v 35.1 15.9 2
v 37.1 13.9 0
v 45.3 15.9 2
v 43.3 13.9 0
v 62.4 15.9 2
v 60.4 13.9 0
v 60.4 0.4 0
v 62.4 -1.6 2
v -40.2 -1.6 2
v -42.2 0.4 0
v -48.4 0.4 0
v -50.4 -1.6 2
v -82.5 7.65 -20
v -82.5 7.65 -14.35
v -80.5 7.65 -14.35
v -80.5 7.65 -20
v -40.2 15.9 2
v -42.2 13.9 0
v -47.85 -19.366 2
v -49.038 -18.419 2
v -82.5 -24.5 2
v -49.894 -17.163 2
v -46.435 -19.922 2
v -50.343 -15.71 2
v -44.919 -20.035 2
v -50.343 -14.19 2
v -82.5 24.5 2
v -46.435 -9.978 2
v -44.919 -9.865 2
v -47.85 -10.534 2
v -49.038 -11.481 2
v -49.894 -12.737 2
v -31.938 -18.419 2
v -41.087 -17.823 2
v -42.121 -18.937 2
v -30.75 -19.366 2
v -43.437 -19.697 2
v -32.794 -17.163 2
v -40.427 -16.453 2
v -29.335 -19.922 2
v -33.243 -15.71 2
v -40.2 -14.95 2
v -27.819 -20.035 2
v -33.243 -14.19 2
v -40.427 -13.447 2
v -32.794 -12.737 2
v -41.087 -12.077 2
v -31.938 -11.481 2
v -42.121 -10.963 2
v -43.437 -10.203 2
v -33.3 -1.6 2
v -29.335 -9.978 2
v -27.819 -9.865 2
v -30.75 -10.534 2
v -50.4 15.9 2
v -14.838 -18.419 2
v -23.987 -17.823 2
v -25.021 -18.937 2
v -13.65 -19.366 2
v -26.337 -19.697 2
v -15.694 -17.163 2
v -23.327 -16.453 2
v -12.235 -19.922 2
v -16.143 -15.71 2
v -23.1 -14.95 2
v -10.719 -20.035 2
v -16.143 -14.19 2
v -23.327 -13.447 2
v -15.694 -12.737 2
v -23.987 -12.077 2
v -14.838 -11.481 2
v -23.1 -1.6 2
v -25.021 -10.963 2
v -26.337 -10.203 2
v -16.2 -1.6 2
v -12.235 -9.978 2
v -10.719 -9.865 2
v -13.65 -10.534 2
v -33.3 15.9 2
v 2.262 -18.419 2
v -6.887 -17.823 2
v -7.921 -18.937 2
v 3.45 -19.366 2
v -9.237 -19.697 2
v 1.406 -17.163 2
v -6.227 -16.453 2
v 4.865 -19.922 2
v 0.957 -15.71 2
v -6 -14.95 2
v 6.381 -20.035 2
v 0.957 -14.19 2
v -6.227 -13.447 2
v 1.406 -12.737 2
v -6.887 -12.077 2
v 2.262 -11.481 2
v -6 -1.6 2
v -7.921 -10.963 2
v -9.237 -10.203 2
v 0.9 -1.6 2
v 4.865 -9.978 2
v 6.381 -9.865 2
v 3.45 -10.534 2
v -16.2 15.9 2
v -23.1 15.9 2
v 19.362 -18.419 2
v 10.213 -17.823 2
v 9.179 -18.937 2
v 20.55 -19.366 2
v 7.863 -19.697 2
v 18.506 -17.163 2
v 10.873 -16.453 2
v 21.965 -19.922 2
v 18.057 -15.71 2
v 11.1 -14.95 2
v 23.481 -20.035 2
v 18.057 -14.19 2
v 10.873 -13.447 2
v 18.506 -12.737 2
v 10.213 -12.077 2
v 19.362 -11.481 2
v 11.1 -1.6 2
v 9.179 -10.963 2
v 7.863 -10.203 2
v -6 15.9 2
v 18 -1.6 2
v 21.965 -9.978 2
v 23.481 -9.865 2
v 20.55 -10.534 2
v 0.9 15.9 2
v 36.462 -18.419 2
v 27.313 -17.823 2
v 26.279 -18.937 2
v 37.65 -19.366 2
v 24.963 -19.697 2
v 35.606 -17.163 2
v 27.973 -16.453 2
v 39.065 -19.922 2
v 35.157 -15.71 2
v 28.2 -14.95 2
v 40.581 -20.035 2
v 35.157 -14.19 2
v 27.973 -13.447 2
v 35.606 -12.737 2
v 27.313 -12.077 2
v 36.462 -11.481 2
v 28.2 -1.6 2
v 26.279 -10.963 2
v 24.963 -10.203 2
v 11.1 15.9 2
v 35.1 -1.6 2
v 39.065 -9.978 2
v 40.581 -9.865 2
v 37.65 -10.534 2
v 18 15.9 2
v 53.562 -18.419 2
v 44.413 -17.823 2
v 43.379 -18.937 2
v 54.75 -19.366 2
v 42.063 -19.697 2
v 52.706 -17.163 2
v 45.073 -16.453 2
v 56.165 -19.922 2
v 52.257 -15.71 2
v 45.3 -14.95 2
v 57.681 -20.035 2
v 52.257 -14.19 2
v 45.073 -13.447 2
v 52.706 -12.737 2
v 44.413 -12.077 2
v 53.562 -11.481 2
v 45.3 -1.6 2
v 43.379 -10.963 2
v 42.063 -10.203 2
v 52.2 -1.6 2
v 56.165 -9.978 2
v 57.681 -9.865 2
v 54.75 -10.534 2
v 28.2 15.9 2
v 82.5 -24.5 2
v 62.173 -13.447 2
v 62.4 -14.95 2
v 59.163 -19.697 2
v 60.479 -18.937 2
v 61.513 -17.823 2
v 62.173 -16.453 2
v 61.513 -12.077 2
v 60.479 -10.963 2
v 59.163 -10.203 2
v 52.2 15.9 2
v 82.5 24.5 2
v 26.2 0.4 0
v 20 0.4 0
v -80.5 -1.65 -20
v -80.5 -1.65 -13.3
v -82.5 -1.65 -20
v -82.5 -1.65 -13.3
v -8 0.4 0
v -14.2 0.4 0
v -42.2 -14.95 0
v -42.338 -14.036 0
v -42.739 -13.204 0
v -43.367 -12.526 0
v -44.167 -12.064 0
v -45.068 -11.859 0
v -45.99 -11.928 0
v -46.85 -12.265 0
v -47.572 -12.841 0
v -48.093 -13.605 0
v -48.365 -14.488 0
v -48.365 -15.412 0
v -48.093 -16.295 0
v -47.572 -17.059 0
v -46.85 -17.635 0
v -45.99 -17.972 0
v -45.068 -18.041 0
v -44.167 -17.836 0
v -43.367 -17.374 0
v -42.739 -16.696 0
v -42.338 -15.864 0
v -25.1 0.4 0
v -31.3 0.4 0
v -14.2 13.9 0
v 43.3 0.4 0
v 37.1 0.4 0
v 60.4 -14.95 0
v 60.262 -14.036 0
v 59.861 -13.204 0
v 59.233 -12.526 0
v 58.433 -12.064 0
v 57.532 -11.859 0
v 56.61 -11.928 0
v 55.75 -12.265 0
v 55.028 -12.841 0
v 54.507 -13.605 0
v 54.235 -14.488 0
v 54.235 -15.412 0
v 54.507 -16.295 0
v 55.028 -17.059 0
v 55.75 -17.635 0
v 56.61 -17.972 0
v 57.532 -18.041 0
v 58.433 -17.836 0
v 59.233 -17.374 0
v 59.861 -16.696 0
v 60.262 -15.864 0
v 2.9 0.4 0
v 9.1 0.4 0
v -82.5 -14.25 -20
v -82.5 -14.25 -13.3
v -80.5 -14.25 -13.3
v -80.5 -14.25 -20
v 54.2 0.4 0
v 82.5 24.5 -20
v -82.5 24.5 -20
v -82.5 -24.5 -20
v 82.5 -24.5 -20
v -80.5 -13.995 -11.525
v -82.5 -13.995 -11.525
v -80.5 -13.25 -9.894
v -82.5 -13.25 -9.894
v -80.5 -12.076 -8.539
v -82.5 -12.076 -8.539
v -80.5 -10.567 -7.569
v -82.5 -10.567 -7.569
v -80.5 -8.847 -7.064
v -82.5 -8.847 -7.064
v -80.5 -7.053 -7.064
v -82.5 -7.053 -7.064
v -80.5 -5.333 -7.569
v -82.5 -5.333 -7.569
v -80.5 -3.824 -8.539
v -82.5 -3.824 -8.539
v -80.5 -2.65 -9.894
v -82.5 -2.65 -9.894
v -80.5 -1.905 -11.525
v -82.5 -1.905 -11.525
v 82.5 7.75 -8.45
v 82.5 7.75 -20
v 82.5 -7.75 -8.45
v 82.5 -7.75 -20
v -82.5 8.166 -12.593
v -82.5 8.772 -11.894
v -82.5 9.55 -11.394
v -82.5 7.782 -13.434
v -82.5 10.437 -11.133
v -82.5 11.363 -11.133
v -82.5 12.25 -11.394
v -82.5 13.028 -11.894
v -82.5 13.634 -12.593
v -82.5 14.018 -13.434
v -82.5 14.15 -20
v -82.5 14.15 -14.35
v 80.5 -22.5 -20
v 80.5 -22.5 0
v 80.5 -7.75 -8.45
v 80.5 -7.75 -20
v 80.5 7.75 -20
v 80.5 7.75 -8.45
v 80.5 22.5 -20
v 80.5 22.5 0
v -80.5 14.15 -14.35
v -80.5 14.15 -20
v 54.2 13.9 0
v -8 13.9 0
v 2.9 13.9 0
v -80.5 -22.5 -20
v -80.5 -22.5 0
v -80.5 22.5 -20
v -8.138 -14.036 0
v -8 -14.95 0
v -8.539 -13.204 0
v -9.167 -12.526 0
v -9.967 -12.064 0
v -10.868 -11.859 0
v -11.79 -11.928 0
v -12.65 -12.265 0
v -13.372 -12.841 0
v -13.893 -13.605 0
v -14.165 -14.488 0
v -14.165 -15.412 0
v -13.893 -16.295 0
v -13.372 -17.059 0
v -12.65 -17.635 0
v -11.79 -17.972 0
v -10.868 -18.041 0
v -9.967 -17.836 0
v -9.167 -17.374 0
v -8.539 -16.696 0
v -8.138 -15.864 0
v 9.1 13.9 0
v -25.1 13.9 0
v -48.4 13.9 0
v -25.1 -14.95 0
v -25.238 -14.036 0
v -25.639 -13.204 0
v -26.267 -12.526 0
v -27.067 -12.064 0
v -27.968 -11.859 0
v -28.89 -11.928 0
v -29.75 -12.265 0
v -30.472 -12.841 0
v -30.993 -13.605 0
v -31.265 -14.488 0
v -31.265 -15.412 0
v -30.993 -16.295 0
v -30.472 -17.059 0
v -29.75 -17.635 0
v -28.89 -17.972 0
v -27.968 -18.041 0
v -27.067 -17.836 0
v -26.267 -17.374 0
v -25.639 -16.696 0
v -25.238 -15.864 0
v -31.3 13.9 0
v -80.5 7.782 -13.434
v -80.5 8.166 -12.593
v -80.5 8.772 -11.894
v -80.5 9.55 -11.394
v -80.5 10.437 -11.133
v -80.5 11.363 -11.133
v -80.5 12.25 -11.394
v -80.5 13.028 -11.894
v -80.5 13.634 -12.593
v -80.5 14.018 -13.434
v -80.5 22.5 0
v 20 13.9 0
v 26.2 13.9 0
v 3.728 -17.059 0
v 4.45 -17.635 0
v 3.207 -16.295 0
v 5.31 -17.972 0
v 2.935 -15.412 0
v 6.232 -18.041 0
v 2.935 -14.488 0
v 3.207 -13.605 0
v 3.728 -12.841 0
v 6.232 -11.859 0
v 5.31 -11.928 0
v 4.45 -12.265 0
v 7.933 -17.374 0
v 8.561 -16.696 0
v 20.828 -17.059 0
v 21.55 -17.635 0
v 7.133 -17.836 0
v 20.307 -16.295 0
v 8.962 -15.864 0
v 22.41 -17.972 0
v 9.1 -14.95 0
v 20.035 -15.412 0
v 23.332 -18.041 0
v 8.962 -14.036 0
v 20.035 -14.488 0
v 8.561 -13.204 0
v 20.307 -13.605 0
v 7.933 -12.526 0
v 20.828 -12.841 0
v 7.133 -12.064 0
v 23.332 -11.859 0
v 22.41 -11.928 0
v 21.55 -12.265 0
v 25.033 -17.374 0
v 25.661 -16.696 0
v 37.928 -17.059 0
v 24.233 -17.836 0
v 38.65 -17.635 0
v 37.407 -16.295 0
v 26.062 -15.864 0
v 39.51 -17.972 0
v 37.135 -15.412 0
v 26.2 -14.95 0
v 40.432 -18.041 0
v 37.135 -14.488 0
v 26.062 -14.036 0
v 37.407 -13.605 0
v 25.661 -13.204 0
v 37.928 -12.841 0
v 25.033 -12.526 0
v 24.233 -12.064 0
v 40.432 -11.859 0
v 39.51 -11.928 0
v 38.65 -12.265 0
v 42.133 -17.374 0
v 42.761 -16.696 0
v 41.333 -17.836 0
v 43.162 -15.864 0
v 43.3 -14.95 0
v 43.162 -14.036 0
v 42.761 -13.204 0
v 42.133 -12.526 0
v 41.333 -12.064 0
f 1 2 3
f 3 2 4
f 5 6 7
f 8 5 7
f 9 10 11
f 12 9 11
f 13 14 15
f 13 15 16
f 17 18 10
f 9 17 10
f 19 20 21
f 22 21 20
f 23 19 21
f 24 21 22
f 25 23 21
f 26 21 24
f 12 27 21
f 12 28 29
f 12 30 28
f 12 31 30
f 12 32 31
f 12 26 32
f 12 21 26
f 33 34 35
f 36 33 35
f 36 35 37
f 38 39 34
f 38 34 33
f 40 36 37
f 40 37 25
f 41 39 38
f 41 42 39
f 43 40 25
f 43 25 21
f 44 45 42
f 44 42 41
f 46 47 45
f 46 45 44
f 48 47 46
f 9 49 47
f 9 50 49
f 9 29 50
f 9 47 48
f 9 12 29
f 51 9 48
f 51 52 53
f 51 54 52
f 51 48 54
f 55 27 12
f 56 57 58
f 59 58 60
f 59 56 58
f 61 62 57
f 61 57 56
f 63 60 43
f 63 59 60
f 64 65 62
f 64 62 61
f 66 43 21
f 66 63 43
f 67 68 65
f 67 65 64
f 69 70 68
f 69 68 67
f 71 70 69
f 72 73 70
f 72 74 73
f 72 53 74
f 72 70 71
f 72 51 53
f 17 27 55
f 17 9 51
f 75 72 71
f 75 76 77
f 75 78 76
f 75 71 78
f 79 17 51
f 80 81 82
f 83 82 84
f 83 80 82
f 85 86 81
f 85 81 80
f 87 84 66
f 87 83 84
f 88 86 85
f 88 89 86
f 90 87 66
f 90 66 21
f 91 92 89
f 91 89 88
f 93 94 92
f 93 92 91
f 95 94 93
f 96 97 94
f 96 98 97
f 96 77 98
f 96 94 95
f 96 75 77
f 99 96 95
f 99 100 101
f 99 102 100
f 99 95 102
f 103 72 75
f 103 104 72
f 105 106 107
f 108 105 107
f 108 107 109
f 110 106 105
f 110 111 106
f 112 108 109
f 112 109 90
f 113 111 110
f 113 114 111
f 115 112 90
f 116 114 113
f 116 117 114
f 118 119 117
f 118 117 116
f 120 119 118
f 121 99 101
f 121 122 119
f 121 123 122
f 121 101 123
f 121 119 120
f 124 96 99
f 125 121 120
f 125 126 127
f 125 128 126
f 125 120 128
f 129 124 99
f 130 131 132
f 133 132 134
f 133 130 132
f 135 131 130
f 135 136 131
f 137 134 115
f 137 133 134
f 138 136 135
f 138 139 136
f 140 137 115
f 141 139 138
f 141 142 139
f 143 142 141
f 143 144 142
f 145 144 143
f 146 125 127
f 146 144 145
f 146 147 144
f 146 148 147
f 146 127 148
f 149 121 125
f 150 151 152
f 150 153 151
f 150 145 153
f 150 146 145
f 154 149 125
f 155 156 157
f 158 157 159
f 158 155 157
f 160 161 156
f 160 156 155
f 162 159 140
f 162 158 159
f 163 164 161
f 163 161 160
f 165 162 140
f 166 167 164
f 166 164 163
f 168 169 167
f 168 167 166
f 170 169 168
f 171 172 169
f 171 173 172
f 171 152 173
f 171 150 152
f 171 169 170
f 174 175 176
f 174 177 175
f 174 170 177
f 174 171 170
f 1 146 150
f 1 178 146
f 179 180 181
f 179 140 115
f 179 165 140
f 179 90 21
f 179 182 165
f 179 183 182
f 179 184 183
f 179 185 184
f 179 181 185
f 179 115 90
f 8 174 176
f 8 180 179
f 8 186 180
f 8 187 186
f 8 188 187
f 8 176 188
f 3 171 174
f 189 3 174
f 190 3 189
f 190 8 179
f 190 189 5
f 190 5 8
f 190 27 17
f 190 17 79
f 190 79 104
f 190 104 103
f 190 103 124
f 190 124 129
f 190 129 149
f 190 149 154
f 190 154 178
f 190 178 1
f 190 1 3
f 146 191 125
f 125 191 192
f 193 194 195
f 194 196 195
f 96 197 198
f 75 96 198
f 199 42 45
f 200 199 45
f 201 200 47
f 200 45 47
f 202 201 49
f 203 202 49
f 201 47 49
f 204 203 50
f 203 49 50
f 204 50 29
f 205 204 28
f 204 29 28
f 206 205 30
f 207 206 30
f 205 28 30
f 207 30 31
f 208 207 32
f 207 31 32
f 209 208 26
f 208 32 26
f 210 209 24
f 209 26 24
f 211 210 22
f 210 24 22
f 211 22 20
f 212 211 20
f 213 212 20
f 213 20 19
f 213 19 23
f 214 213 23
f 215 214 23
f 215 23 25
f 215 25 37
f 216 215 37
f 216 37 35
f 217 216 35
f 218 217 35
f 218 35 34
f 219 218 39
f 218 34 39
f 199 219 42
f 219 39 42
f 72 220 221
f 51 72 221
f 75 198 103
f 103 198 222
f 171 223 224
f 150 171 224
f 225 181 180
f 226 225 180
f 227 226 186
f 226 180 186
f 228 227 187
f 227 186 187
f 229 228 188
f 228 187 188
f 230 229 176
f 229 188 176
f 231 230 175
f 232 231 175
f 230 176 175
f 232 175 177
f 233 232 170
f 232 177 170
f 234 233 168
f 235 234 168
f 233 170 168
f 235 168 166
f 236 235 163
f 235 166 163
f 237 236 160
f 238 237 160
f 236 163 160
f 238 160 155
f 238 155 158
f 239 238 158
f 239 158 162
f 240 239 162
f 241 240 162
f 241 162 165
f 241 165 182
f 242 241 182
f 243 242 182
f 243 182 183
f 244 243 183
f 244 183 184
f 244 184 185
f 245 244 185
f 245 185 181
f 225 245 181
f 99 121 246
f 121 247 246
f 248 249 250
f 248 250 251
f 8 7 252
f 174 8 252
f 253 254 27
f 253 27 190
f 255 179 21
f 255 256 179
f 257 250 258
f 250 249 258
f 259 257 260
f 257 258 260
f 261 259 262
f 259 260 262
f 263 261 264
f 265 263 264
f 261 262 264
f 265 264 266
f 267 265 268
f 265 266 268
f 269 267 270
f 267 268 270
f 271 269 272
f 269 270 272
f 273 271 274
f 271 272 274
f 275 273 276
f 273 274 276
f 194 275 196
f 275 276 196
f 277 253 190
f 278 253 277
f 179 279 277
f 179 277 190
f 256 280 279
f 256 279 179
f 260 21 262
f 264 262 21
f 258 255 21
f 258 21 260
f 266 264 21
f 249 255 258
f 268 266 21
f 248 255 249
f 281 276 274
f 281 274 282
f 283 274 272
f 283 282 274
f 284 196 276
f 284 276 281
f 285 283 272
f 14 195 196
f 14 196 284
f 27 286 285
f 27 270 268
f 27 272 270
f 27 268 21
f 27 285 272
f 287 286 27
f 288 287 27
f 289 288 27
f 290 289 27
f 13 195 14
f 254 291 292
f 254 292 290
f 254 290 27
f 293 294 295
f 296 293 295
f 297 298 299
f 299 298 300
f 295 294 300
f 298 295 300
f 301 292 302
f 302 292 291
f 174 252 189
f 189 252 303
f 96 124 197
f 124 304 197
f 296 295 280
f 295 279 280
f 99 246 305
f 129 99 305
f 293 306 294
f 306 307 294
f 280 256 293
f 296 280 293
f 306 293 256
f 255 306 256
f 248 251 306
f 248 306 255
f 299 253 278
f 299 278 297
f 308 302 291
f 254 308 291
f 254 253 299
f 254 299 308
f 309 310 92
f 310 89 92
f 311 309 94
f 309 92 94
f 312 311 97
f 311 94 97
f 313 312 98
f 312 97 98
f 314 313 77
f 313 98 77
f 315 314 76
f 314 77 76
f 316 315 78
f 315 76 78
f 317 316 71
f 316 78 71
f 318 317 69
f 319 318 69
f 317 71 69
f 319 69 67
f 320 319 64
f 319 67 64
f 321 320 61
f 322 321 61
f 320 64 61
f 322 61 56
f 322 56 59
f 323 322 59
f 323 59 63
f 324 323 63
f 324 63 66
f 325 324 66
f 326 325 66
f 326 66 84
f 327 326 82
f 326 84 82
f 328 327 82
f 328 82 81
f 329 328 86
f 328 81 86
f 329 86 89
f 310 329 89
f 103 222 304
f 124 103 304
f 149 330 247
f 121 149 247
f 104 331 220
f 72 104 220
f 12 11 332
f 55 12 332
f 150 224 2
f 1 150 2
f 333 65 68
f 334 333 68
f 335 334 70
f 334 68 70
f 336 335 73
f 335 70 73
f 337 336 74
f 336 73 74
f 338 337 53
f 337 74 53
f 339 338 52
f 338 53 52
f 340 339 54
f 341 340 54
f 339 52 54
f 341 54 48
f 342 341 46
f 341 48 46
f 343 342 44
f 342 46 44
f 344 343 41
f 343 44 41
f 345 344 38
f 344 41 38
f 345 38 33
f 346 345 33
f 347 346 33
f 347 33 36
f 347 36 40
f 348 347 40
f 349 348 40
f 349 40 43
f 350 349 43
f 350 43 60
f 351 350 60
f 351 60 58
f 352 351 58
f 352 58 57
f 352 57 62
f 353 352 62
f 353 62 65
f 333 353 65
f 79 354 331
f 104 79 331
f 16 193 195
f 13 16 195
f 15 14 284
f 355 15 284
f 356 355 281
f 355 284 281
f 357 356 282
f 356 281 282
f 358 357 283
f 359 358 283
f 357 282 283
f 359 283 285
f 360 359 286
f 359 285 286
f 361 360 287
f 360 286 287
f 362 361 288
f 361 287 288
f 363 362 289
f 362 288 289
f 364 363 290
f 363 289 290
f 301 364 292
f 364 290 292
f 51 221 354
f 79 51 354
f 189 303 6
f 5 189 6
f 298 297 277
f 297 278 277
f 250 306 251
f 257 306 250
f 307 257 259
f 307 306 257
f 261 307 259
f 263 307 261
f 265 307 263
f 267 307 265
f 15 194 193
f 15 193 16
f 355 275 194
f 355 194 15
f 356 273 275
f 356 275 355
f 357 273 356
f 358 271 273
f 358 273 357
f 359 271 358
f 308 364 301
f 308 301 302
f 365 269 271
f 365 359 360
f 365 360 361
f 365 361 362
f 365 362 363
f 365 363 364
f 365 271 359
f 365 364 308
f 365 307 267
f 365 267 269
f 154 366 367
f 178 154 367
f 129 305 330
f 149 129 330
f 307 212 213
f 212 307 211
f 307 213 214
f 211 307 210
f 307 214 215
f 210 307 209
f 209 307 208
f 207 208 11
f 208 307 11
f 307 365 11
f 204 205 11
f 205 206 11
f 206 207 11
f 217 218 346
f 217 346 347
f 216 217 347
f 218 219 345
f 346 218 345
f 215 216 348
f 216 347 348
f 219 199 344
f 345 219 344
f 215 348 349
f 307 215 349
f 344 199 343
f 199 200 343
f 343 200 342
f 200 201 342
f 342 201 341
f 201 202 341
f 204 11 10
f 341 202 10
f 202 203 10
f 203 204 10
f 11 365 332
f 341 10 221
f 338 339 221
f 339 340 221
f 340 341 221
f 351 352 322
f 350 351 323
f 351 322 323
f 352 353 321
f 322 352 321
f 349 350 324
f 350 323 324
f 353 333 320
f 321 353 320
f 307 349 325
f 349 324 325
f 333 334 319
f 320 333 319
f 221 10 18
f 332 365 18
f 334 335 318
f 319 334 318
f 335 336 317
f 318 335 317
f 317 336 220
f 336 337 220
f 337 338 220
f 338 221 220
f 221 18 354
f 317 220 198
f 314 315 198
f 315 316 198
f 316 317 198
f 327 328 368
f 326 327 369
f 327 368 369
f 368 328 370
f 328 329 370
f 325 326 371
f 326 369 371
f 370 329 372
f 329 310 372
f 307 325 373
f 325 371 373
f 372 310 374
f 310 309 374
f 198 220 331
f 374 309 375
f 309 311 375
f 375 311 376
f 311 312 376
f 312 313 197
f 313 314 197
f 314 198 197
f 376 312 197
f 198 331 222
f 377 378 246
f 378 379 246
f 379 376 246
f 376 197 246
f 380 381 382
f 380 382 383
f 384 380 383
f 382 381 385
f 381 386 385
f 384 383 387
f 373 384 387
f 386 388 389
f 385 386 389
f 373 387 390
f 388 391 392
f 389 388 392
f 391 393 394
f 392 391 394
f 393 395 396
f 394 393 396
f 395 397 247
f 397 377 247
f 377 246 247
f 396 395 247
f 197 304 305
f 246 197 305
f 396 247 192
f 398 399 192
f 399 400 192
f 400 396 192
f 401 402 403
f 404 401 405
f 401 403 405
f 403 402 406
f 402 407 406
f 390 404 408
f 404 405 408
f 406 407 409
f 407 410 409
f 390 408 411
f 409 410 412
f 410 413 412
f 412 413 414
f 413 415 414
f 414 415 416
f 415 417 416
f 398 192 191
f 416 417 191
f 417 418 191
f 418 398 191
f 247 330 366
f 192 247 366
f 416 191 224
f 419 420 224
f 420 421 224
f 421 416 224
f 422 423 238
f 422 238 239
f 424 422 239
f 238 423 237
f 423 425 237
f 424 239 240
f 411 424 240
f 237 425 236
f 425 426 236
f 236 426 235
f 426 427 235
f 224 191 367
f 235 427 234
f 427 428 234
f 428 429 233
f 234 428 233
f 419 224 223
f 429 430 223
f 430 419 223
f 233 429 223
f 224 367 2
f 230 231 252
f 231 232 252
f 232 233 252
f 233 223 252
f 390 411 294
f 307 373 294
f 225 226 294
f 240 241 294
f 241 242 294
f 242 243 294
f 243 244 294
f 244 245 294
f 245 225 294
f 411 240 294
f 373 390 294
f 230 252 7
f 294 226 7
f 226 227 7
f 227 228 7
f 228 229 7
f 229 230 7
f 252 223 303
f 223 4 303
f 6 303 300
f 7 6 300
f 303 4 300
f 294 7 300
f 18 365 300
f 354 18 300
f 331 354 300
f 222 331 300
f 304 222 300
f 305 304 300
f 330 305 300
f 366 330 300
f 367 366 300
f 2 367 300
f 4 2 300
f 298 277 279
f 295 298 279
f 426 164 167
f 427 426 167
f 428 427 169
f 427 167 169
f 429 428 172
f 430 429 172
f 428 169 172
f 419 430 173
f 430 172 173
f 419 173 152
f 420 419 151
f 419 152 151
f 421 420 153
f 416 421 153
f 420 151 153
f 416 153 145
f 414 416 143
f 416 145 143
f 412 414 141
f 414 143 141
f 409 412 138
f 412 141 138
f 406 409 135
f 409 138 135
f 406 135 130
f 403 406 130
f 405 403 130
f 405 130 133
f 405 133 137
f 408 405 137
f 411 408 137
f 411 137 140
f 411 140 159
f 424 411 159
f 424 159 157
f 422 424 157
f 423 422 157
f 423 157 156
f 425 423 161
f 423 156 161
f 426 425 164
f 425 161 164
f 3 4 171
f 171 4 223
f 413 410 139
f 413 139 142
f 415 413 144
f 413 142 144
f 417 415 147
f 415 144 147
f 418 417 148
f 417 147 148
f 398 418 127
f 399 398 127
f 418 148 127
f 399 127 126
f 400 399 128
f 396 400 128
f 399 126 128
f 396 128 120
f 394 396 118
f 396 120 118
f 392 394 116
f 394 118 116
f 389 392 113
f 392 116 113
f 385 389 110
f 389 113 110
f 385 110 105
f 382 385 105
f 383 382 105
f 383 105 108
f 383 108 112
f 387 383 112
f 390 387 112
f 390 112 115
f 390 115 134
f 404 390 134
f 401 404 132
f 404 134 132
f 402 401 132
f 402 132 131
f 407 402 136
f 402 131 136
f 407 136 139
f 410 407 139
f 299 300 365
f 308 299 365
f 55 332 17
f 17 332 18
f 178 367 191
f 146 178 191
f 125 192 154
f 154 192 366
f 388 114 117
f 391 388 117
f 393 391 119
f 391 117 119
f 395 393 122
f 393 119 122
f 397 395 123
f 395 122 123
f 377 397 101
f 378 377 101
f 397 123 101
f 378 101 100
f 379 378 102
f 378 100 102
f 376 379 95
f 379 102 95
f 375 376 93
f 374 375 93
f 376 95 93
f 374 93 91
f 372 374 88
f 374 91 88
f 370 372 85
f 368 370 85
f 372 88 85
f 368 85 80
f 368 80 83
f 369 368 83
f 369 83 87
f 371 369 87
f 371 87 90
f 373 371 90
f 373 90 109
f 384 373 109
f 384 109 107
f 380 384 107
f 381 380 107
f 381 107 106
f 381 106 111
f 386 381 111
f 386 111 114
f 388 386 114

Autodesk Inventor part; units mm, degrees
ref_plane "YZ Plane" through (0, 0, 0) normal (1, 0, 0) x (0, 1, 0)
ref_plane "XZ Plane" through (0, 0, 0) normal (0, 1, 0) x (-1, 0, 0)
ref_plane "XY Plane" through (0, 0, 0) normal (0, 0, 1) x (1, 0, 0)
sketch "Sketch1" plane through (0, 0, 0) normal (0, 0, 1) x (1, 0, 0)
  line L0 (82.5, -24.5) -> (-82.5, -24.5)
  line L1 (-82.5, -24.5) -> (-82.5, 24.5)
  line L2 (-82.5, 24.5) -> (82.5, 24.5)
  line L3 (82.5, 24.5) -> (82.5, -24.5)
  circle A0 centre (-28.2, -14.95) radius 3.1 projected
  circle A1 centre (6, -14.95) radius 3.1 projected
  circle A2 centre (40.2, -14.95) radius 3.1 projected
  circle A3 centre (57.3, -14.95) radius 3.1 projected
  circle A4 centre (23.1, -14.95) radius 3.1 projected
  circle A5 centre (-11.1, -14.95) radius 3.1 projected
  circle A6 centre (-45.3, -14.95) radius 3.1 projected
  line L4 (-25.1, 0.4) -> (-31.3, 0.4) projected
  line L5 (-31.3, 0.4) -> (-31.3, 13.9) projected
  line L6 (-31.3, 13.9) -> (-25.1, 13.9) projected
  line L7 (-25.1, 13.9) -> (-25.1, 0.4) projected
  line L8 (9.1, 0.4) -> (2.9, 0.4) projected
  line L9 (2.9, 0.4) -> (2.9, 13.9) projected
  line L10 (2.9, 13.9) -> (9.1, 13.9) projected
  line L11 (9.1, 13.9) -> (9.1, 0.4) projected
  line L12 (43.3, 0.4) -> (37.1, 0.4) projected
  line L13 (37.1, 0.4) -> (37.1, 13.9) projected
  line L14 (37.1, 13.9) -> (43.3, 13.9) projected
  line L15 (43.3, 13.9) -> (43.3, 0.4) projected
  line L16 (54.2, 0.4) -> (54.2, 13.9) projected
  line L17 (54.2, 13.9) -> (60.4, 13.9) projected
  line L18 (60.4, 13.9) -> (60.4, 0.4) projected
  line L19 (60.4, 0.4) -> (54.2, 0.4) projected
  line L20 (26.2, 0.4) -> (20, 0.4) projected
  line L21 (20, 0.4) -> (20, 13.9) projected
  line L22 (20, 13.9) -> (26.2, 13.9) projected
  line L23 (26.2, 13.9) -> (26.2, 0.4) projected
  line L24 (-8, 0.4) -> (-14.2, 0.4) projected
  line L25 (-14.2, 0.4) -> (-14.2, 13.9) projected
  line L26 (-14.2, 13.9) -> (-8, 13.9) projected
  line L27 (-8, 13.9) -> (-8, 0.4) projected
  line L28 (-42.2, 0.4) -> (-48.4, 0.4) projected
  line L29 (-48.4, 0.4) -> (-48.4, 13.9) projected
  line L30 (-48.4, 13.9) -> (-42.2, 13.9) projected
  line L31 (-42.2, 13.9) -> (-42.2, 0.4) projected
  arc A7 (73.05, -22.25) -> (80.25, -15.05) centre (73.05, -15.05) ccw projected
  line L32 (80.25, -15.05) -> (80.25, 15.05) projected
  arc A8 (80.25, 15.05) -> (73.05, 22.25) centre (73.05, 15.05) ccw projected
  line L33 (73.05, 22.25) -> (-73.05, 22.25) projected
  arc A9 (-73.05, 22.25) -> (-80.25, 15.05) centre (-73.05, 15.05) ccw projected
  line L34 (-80.25, 15.05) -> (-80.25, -15.05) projected
  arc A10 (-80.25, -15.05) -> (-73.05, -22.25) centre (-73.05, -15.05) ccw projected
  line L35 (-73.05, -22.25) -> (73.05, -22.25) projected
  line L36 (-73.05, -22.25) -> (73.05, -22.25) projected
  point P0 (0, 0)
  dimension "d0" = 2.25
  dimension "d1" = 2.25
  dimension "d2" = 2.25
  dimension "d3" = 2.25
extrude "Extrusion1" add sketch "Sketch1" along normal blind 2 contours L0 L1 L2 L3 | L35 A10 L34 A9 L33 A8 L32 A7
sketch "Sketch2" plane through (0, 0, 0) normal (0, 0, -1) x (-1, 0, 0)
  line L0 (-82.5, -24.5) -> (-82.5, 24.5) projected
  line L1 (-82.5, -24.5) -> (-80.5, -24.5)
  line L2 (-80.5, -24.5) -> (-80.5, 24.5)
  line L3 (-80.5, 24.5) -> (-82.5, 24.5)
  line L4 (-82.5, 24.5) -> (-82.5, -24.5)
  line L5 (82.5, 24.5) -> (-82.5, 24.5) projected
  line L6 (82.5, 24.5) -> (82.5, -24.5) projected
  line L7 (-82.5, -24.5) -> (82.5, -24.5)
  line L8 (82.5, -24.5) -> (82.5, -22.5)
  line L9 (82.5, -22.5) -> (-82.5, -22.5)
  line L10 (-82.5, -22.5) -> (-82.5, -24.5)
  line L11 (82.5, -24.5) -> (-82.5, -24.5) projected
  line L12 (-82.5, 24.5) -> (82.5, 24.5) projected
  line L13 (82.5, -24.5) -> (80.5, -24.5)
  line L14 (80.5, -24.5) -> (80.5, 24.5)
  line L15 (80.5, 24.5) -> (82.5, 24.5)
  line L16 (82.5, 24.5) -> (82.5, -24.5)
  line L17 (82.5, 24.5) -> (-82.5, 24.5)
  line L18 (-82.5, 24.5) -> (-82.5, 22.5)
  line L19 (-82.5, 22.5) -> (82.5, 22.5)
  line L20 (82.5, 22.5) -> (82.5, 24.5)
  point P0 (0, 0)
  dimension "d6" = 2
  dimension "d7" = 2
  dimension "d8" = 2
  dimension "d9" = 2
extrude "Extrusion2" add sketch "Sketch2" along normal blind 20 contours L0 L9 L2 L1 | L0 L19 L2 L9 | L2 L9 L14 L7 | L0 L3 L2 L19 | L14 L9 L6 L7 | L2 L5 L14 L19 | L14 L19 L6 L9 | L14 L5 L6 L19
sketch "Sketch3" plane through (-82.5, -24.5, 2) normal (-1, 0, 0) x (0, 0, 1)
  circle A0 centre (-15.3, 16.55) radius 5.3 construction
  circle A1 centre (-16.35, 35.4) radius 2.25 construction
  arc A2 (-16.35, 32.15) -> (-16.35, 38.65) centre (-16.35, 35.4) ccw
  arc A3 (-15.3, 10.25) -> (-15.3, 22.85) centre (-15.3, 16.55) ccw
  line L0 (-16.35, 38.65) -> (-22, 38.65)
  line L1 (-22, 2) -> (-22, 47) projected
  line L2 (-16.35, 32.15) -> (-22, 32.15)
  line L3 (-15.3, 22.85) -> (-22, 22.85)
  line L4 (-15.3, 10.25) -> (-22, 10.25)
  line L5 (-22, 10.25) -> (-22, 22.85)
  line L6 (-22, 32.15) -> (-22, 38.65)
  arc A4 (-15.3, 22.85) -> (-15.3, 10.25) centre (-15.3, 16.55) ccw construction
  arc A5 (-16.35, 38.65) -> (-16.35, 32.15) centre (-16.35, 35.4) ccw construction
  point P0 (-2, 24.5)
  dimension "d12" = 1
  dimension "d13" = 1
extrude "Extrusion3" cut sketch "Sketch3" against normal blind 20
sketch "Sketch4" plane through (82.5, -24.5, 2) normal (1, 0, 0) x (0, 0, -1)
  line L0 (18.25, 17.75) -> (11.45, 17.75) projected
  line L1 (11.45, 17.75) -> (11.45, 31.25) projected
  line L2 (11.45, 31.25) -> (18.25, 31.25) projected
  line L3 (18.25, 31.25) -> (18.25, 17.75) projected
  line L4 (25.6, 9.45) -> (2, 9.45) projected
  line L5 (25.6, 39.55) -> (25.6, 9.45) projected
  line L6 (2, 39.55) -> (25.6, 39.55) projected
  line L7 (2, 9.45) -> (2, 39.55) projected
  line L8 (10.45, 16.75) -> (22, 16.75)
  line L9 (22, 16.75) -> (22, 32.25)
  line L10 (22, 32.25) -> (10.45, 32.25)
  line L11 (10.45, 32.25) -> (10.45, 16.75)
  line L12 (22, 49) -> (22, 0) projected
  point P0 (2, 24.5)
  dimension "d16" = 1
  dimension "d17" = 1
  dimension "d19" = 1
extrude "Extrusion4" cut sketch "Sketch4" against normal blind 20 contours L0 L1 L2 L3 | L8 L11 L10 L9
chamfer "Chamfer1" distance 2 angle 45 35 edges at (-45.3, 13.9, 2) (-48.4, 7.15, 2) (-45.3, 0.4, 2) (-42.2, 7.15, 2) (-31.3, 7.15, 2) (-28.2, 13.9, 2) (-25.1, 7.15, 2) (-28.2, 0.4, 2) (-14.2, 7.15, 2) (-11.1, 13.9, 2) (-8, 7.15, 2) (-11.1, 0.4, 2) (2.9, 7.15, 2) (6, 13.9, 2) (9.1, 7.15, 2) (6, 0.4, 2) (26.2, 7.15, 2) (23.1, 13.9, 2) (20, 7.15, 2) (23.1, 0.4, 2) (40.2, 0.4, 2) (37.1, 7.15, 2) (40.2, 13.9, 2) (43.3, 7.15, 2) (54.2, 7.15, 2) (57.3, 13.9, 2) (60.4, 7.15, 2) (57.3, 0.4, 2) (54.2, -14.95, 2) (37.1, -14.95, 2) (20, -14.95, 2) (2.9, -14.95, 2) (-14.2, -14.95, 2) (-31.3, -14.95, 2) (-48.4, -14.95, 2)
equation "\"d1\" = d0"
equation "\"d2\" = d0"
equation "\"d3\" = d0"
equation "\"d17\" = d16"
equation "\"d19\" = d16"
properties part number "cover"
